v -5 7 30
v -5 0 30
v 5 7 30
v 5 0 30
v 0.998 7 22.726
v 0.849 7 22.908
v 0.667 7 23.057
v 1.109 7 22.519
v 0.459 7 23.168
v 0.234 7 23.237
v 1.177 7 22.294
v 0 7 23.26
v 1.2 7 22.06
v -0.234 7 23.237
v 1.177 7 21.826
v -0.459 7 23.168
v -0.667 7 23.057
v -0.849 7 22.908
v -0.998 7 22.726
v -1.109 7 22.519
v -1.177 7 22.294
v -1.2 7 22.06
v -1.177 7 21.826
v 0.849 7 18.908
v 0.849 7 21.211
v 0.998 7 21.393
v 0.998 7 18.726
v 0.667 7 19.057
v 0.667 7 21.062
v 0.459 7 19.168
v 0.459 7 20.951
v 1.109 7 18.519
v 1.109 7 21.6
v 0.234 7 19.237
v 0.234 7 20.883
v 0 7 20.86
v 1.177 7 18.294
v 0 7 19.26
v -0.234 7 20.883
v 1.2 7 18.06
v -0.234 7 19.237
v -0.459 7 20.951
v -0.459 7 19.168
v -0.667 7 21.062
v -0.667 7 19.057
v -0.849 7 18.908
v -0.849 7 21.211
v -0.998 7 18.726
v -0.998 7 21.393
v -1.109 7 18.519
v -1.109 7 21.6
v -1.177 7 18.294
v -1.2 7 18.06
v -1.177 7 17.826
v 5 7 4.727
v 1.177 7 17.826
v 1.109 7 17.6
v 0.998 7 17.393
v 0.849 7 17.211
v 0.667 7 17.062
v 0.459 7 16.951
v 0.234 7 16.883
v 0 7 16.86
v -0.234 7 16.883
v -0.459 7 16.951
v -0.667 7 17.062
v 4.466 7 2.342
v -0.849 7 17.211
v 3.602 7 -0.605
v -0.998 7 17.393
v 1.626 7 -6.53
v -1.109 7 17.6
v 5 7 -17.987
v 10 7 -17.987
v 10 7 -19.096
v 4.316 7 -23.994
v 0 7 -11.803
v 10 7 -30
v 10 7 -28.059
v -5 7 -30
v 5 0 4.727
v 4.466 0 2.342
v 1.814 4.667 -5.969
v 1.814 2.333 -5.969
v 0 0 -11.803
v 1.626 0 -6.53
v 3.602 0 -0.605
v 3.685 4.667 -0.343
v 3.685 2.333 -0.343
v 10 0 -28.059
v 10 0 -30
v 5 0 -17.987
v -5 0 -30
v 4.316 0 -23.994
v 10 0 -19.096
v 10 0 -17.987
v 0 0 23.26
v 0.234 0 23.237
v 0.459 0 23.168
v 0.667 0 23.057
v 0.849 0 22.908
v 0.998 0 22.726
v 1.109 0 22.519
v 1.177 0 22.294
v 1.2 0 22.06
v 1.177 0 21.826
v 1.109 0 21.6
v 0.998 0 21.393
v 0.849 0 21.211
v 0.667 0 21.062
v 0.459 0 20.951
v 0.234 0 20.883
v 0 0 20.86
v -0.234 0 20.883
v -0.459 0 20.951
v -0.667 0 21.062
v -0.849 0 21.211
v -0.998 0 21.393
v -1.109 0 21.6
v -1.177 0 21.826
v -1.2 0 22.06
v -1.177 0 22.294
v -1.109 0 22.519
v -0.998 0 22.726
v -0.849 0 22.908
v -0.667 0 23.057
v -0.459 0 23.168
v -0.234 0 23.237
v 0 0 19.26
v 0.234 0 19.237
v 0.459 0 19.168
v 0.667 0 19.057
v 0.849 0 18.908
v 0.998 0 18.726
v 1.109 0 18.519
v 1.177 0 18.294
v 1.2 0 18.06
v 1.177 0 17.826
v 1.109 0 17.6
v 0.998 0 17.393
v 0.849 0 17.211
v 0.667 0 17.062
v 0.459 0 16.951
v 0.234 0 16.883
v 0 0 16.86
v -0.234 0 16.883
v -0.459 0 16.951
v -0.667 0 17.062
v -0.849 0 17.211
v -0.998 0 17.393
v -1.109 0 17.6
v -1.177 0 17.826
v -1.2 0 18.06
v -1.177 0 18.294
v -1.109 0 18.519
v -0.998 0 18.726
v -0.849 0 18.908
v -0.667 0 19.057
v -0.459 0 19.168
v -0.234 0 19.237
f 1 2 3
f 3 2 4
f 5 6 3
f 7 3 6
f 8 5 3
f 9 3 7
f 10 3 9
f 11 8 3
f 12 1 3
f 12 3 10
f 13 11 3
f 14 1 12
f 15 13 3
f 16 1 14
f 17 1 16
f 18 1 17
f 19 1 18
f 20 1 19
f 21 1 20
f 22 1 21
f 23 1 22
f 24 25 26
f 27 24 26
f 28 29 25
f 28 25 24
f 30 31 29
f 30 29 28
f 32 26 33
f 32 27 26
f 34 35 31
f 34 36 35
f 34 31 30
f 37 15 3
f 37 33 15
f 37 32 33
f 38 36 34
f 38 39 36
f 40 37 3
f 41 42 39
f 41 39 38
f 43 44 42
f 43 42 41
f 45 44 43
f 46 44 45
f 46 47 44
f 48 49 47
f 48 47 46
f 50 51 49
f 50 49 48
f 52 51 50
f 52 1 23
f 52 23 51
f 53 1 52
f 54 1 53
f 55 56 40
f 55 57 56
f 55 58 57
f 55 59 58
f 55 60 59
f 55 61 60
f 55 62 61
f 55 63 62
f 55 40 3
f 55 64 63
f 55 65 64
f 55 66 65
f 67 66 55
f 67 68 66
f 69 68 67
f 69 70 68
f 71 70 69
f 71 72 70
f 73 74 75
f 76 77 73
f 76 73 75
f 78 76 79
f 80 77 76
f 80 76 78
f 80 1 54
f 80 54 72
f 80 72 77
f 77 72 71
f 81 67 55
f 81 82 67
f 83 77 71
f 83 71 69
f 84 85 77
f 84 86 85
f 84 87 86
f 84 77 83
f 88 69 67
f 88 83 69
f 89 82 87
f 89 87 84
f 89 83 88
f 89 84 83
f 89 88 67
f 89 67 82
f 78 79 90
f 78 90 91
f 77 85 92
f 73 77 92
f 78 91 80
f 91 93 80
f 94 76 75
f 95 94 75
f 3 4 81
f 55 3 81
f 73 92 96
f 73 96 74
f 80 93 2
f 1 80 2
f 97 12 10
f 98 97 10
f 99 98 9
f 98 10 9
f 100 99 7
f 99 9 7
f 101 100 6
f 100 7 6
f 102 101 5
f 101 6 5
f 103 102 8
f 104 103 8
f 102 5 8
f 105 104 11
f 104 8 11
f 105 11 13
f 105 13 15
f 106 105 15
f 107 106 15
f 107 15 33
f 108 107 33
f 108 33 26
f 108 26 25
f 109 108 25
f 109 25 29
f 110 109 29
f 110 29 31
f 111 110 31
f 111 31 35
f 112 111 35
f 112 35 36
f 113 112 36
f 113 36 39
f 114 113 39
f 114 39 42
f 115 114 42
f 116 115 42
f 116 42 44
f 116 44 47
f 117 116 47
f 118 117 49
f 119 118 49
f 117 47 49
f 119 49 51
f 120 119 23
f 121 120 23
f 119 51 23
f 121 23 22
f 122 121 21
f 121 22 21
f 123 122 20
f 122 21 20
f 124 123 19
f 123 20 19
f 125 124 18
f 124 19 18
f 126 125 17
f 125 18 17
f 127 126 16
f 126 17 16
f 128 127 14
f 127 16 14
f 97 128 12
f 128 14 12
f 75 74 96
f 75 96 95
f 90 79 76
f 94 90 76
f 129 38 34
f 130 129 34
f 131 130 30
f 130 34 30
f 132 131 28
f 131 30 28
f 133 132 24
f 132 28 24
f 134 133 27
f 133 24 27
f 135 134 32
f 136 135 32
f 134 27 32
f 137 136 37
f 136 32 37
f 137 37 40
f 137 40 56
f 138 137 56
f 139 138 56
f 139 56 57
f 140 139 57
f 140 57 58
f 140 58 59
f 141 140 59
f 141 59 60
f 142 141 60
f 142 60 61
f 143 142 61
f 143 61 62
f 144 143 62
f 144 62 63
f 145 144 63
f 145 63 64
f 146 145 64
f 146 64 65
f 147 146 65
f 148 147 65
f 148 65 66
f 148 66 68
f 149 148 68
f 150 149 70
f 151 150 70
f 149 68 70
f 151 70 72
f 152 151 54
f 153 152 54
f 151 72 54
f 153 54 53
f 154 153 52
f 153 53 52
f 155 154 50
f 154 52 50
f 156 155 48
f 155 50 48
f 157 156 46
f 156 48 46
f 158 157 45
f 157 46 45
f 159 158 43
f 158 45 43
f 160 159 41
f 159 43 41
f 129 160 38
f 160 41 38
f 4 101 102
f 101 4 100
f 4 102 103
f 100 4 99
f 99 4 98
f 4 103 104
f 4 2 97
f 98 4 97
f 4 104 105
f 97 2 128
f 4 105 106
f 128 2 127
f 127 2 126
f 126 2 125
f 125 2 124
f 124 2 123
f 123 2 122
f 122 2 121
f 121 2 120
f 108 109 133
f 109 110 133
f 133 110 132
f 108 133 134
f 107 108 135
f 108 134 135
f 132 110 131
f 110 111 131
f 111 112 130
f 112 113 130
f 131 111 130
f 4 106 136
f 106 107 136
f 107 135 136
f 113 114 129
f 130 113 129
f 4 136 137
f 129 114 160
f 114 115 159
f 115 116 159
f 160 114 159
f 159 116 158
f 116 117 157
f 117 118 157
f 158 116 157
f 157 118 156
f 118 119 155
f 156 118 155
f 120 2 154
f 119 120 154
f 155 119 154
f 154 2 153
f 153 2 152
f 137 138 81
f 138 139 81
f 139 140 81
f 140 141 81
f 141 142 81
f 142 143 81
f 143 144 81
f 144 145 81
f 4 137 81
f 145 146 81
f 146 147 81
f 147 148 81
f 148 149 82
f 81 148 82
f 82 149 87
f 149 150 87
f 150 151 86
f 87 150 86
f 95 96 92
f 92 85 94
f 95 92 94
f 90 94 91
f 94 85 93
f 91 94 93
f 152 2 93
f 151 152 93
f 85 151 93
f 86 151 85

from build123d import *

# Parameters (mm, degrees)
BOSS_EXTRUDE1_DEPTH = 7
SKETCH2_W           = 12.012879562
SKETCH2_H           = 7
BOSS_EXTRUDE3_DEPTH = 5
CUT_EXTRUDE1_DEPTH  = 33.388269627
SKETCH4_R           = 1.2
CUT_EXTRUDE2_DEPTH  = 33.388269627


with BuildPart() as part:
    # Sketch1 → Boss-Extrude1 (new body)
    with BuildSketch(Plane(origin=(0, 0, 0), x_dir=(1, 0, 0), z_dir=(0, 1, 0))):
        with BuildLine():
            add(Edge.make_bspline(
                [(0, 11.802718513), (1.58072242, 5.981279649), (4.167222532, -0.050595561), (5, -4.726791588)],
                knots=[0.482657311, 0.482657311, 0.482657311, 0.482657311, 0.853883687, 0.853883687, 0.853883687, 0.853883687], degree=3))
            Line((0, 11.802718513), (5, 17.987120438))
            Line((5, 17.987120438), (5, 30))
            Line((5, 30), (-5, 30))
            Line((-5, 30), (-5, -30))
            Line((-5, -30), (5, -30))
            Line((5, -30), (5, -4.726791588))
        make_face()
    extrude(amount=BOSS_EXTRUDE1_DEPTH)

    # Sketch2 → Boss-Extrude3 (add)
    with BuildSketch(Plane(origin=(5, 0, 0), x_dir=(0, 0, -1), z_dir=(1, 0, 0))):
        with Locations((23.993560219, 3.5)):
            Rectangle(SKETCH2_W, SKETCH2_H)
    extrude(amount=BOSS_EXTRUDE3_DEPTH)

    # Sketch3 → Cut-Extrude1 (cut, through all)
    with BuildSketch(Plane(origin=(0, 7, 0), x_dir=(1, 0, 0), z_dir=(0, 1, 0))):
        Polygon((10, 28.05876983), (4.315561677, 23.993560219), (10, 19.0964891), align=None)
    extrude(amount=-CUT_EXTRUDE1_DEPTH, mode=Mode.SUBTRACT)

    # Sketch4 → Cut-Extrude2 (cut, through all)
    with BuildSketch(Plane(origin=(0, 7, 0), x_dir=(1, 0, 0), z_dir=(0, 1, 0))):
        with Locations(Location((0, -22.059676008, 0), (0, 0, 270))):
            Circle(SKETCH4_R)
        with Locations(Location((0, -18.059676008, 0), (0, 0, 270))):
            Circle(SKETCH4_R)
    extrude(amount=-CUT_EXTRUDE2_DEPTH, mode=Mode.SUBTRACT)


solid = part.part
